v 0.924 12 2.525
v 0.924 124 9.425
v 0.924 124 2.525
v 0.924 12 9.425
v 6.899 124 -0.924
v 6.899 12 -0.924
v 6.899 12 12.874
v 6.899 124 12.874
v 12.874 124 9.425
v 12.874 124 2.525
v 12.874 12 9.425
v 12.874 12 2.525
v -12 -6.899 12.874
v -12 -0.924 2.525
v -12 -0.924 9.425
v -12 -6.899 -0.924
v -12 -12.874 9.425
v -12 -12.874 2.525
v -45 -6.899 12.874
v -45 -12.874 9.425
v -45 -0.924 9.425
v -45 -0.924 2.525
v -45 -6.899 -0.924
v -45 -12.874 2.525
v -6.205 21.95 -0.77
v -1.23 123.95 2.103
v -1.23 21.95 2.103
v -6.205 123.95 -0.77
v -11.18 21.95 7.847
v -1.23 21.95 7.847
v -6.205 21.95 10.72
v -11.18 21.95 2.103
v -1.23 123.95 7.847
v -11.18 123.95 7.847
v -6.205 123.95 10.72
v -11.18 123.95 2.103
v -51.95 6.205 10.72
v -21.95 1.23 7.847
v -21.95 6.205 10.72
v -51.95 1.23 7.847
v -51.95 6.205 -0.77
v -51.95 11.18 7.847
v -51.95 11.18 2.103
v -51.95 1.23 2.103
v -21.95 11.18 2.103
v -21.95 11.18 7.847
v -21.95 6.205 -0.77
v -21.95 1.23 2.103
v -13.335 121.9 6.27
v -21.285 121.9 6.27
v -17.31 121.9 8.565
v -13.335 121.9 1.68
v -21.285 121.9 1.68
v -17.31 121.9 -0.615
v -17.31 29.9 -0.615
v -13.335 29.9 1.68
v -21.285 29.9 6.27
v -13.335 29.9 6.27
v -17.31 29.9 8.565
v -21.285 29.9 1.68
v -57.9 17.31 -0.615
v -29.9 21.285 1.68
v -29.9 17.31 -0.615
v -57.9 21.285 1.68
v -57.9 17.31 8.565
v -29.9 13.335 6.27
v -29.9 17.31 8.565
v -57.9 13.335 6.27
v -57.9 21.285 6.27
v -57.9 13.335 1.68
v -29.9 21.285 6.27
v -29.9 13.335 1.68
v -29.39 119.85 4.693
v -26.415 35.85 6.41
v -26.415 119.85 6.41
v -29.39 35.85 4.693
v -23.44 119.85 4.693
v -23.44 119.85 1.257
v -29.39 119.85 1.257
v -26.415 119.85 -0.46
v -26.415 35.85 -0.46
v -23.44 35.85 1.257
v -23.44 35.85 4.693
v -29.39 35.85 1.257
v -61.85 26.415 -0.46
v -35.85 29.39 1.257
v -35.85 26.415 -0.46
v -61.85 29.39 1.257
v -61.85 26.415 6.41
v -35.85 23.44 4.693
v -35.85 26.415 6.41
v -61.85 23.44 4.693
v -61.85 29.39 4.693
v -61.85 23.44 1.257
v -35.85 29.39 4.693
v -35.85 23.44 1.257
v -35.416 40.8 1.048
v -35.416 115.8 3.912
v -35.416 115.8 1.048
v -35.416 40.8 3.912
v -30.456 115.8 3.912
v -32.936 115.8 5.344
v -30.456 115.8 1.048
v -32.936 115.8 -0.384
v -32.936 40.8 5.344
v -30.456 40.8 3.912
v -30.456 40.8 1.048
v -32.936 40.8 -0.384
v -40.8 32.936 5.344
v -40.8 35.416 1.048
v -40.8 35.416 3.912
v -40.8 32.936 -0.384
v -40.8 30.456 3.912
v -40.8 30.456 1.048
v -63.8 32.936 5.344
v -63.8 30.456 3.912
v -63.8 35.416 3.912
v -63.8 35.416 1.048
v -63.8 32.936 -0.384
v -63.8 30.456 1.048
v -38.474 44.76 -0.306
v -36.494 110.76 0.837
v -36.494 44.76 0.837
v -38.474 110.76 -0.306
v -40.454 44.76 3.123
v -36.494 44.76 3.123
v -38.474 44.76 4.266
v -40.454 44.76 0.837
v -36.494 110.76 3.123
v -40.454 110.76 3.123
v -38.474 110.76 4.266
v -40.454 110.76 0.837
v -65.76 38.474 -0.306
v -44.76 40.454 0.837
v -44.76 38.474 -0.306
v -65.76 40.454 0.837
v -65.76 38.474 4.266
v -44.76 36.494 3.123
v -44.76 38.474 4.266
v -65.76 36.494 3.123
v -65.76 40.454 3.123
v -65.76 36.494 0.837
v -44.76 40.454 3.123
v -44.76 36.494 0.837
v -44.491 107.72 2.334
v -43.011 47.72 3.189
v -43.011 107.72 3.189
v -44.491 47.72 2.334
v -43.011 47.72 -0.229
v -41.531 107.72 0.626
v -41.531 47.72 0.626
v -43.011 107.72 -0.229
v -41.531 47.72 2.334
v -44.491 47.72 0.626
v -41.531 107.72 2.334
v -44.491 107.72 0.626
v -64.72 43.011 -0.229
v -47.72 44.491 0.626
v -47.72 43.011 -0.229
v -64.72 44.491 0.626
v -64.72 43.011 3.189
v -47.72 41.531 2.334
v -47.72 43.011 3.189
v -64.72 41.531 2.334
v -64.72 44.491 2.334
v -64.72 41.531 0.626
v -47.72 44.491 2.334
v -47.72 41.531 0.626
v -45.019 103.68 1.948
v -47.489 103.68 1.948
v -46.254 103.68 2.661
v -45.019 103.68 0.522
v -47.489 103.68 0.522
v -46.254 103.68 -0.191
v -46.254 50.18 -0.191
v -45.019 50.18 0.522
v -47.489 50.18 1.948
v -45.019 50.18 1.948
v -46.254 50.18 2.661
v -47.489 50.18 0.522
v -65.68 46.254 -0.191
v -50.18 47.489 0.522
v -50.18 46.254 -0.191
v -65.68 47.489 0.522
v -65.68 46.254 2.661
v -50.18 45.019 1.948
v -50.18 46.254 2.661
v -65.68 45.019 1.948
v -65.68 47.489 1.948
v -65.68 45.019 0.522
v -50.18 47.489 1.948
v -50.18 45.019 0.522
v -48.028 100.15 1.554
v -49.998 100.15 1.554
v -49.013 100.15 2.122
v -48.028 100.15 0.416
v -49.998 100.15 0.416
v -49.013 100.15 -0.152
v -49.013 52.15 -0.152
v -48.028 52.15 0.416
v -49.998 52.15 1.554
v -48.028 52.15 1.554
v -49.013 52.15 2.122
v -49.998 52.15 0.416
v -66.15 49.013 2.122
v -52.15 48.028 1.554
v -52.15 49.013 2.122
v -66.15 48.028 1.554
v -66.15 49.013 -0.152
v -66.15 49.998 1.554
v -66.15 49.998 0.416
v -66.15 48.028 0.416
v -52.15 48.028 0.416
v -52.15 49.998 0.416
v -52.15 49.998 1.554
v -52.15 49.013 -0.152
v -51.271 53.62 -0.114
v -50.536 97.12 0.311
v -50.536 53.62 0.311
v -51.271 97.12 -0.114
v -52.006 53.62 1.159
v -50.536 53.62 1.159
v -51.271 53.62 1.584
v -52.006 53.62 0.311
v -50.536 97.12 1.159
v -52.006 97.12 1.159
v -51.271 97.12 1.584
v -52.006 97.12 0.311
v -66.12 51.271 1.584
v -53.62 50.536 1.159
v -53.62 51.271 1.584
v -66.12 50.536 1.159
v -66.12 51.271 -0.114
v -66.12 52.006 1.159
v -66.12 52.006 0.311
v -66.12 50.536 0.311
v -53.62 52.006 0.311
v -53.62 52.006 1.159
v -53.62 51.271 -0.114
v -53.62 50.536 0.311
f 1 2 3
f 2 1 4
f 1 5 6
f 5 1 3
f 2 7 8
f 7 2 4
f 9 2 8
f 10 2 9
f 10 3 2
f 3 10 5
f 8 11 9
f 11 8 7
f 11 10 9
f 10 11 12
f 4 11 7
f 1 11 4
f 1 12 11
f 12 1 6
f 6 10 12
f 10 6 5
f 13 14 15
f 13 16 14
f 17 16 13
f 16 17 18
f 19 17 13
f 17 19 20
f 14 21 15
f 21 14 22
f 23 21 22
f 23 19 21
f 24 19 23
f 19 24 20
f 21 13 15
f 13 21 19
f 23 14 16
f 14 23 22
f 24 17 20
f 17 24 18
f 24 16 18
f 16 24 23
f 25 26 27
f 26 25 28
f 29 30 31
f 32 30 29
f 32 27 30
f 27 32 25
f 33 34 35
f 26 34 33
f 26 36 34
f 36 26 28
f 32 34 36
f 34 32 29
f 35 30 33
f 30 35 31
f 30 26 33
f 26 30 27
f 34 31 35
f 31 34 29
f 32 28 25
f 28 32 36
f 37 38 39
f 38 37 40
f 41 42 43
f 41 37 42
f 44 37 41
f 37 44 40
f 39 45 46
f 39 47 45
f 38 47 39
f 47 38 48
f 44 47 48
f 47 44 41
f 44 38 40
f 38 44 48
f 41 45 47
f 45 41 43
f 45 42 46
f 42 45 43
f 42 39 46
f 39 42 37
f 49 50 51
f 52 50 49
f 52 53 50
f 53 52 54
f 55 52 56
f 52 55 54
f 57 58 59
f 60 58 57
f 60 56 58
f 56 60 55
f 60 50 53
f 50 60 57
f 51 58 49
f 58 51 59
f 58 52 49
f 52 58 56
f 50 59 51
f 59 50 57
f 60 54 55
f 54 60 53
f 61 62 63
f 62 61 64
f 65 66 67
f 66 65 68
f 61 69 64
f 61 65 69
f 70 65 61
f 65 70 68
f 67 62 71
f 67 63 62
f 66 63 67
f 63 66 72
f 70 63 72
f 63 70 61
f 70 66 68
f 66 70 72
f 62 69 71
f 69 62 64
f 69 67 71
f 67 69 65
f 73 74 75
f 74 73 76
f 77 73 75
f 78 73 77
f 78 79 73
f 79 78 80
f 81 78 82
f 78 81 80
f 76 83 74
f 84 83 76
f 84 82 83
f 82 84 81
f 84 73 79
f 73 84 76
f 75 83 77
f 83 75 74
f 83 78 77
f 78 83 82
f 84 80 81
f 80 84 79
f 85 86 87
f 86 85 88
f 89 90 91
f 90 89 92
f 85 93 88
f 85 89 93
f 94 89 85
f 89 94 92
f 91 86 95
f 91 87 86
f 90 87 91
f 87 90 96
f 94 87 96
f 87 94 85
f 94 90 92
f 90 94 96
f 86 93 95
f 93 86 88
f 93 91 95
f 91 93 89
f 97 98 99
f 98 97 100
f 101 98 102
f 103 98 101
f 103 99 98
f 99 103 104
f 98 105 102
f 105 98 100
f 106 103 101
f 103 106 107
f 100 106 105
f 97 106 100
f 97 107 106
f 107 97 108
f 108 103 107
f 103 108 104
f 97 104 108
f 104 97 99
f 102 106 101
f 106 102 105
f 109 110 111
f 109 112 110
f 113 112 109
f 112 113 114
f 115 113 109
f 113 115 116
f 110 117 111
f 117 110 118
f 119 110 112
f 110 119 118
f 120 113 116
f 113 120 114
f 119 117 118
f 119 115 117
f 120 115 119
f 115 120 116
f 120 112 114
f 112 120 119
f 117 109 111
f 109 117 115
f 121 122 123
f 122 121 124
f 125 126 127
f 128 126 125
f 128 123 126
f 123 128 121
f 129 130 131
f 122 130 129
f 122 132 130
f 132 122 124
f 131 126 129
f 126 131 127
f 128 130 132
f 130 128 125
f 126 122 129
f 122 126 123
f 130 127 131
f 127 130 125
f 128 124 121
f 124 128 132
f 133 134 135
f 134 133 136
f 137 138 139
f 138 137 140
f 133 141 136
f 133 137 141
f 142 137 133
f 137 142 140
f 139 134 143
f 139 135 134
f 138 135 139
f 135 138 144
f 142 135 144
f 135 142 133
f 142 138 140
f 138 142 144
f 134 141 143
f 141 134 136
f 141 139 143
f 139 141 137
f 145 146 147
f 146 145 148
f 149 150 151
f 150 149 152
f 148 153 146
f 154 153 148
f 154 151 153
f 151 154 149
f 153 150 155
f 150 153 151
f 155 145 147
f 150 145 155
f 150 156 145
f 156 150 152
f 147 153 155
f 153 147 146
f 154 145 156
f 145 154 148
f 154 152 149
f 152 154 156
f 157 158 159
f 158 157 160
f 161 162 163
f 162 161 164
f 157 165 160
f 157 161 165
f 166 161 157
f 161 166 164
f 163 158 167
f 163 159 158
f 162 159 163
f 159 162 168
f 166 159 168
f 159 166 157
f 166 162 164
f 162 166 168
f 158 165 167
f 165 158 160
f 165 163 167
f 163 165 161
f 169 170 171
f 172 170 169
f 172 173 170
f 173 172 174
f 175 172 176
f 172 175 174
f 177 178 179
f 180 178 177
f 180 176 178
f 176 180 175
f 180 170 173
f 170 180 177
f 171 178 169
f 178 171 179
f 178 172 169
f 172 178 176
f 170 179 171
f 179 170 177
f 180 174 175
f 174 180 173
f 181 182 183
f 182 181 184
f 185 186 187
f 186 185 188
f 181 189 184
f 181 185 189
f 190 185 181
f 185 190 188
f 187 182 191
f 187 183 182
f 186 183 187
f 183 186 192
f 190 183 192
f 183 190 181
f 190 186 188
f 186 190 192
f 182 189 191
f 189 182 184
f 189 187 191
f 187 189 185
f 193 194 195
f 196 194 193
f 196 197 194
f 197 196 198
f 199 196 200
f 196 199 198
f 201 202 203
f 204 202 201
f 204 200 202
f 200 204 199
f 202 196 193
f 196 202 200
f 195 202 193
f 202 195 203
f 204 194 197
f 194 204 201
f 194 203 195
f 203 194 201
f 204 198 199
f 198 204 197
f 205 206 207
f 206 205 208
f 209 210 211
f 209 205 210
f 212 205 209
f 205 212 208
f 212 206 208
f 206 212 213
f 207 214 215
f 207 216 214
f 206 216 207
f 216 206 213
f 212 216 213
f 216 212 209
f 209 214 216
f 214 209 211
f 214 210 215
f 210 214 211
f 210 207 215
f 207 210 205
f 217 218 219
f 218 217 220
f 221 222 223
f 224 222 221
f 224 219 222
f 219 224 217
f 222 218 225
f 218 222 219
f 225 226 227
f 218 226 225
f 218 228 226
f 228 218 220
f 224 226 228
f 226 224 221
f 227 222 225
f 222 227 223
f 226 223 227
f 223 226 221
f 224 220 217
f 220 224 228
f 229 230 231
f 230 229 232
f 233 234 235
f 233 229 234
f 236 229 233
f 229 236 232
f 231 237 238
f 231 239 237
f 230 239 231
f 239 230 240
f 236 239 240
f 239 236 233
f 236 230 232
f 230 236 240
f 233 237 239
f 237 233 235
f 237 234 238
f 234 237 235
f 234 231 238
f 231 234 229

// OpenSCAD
// wrench sizes from https://www1.mscdirect.com/PDF/FASTENERS/HexKeys.pdf
// width, length_long_side, length_short_side, bend_radius
wrenches = [
    //[34, 300, 100, 34], // 34mm
    [11.95, 124, 45, 12], // 12mm
    [9.95, 112, 40, 10], // 10mm
    [7.95, 100, 36, 8],  // 8mm
    [5.95, 90, 32, 6],  // 6mm
    [4.96, 80, 28, 5],  // 5mm
    [3.96, 70, 25, 4],  // 4mm
    [2.96, 63, 20, 3],  // 3mm
    [2.47, 56, 18, 2.5],  // 2.5mm
    [1.97, 50, 16, 2],  // 2mm
    [1.47, 45, 14, 1.5],  // 1.5mm
];


module hexagon(d) {
    // d is the distance between parallel edges of the hexagon
    // x, where x is the short side of a 30/60/90 degree triangle
    x = d / (2*sqrt(3));
    polygon([
        [-1 * x, x * sqrt(3)], [x, x * sqrt(3)],
        [2 * x, 0],
        [x, -1 * x * sqrt(3)], [-1 * x, -x * sqrt(3)],
        [-2 * x, 0]
    ]);
}

module hex_key(wrench_diameter, wrench_long_side, wrench_short_side, wrench_bend_radius) {
    union() {
        translate([wrench_diameter / sqrt(3), wrench_bend_radius, 0]) {
            rotate([-90, 90, 0]) {
                linear_extrude(wrench_long_side-wrench_bend_radius) {
                    hexagon(wrench_diameter);
                }
            }
        }

        translate([-wrench_bend_radius, -wrench_diameter / sqrt(3), 0]) {
            rotate([0, 0, 0]) {
                rotate([0, -90, 0]) {
                    linear_extrude(wrench_short_side-wrench_bend_radius) {
                        hexagon(wrench_diameter);
                    }
                }
            }
        }
        
        translate([-wrench_bend_radius, wrench_bend_radius, 0]) {
            difference() {
                rotate_extrude(angle = 90) {
                    rotate([0, 0, -90]) {
                        translate([0, wrench_bend_radius + wrench_diameter / sqrt(3), 0]) {
                            rotate([0, 0, 0]) {
                                hexagon(wrench_diameter);
                            }
                        }
                    }
                }
                rotate([0, 0, 90]) {
                    translate([-50 * wrench_diameter, 0, -50 * wrench_diameter]) {
                        cube(100*wrench_diameter);
                    }
                }
                translate([-50 * wrench_diameter, 0, -50 * wrench_diameter]) {
                    cube(100*wrench_diameter);
                }
            }
        }
    }
}

function sum_width(wrenches, cur_position, final_position)
    = cur_position > final_position ? 0 : wrenches[cur_position][0] + sum_width(wrenches, cur_position+1, final_position);

for (i=[0:len(wrenches)-1]) {
    offset = sum_width(wrenches, 0, i-1);
    
    wrench = wrenches[i];
    translate([-offset, offset, wrench[0]/2]) {
        hex_key(wrench[0], wrench[1], wrench[2], wrench[3]);
    }
}
